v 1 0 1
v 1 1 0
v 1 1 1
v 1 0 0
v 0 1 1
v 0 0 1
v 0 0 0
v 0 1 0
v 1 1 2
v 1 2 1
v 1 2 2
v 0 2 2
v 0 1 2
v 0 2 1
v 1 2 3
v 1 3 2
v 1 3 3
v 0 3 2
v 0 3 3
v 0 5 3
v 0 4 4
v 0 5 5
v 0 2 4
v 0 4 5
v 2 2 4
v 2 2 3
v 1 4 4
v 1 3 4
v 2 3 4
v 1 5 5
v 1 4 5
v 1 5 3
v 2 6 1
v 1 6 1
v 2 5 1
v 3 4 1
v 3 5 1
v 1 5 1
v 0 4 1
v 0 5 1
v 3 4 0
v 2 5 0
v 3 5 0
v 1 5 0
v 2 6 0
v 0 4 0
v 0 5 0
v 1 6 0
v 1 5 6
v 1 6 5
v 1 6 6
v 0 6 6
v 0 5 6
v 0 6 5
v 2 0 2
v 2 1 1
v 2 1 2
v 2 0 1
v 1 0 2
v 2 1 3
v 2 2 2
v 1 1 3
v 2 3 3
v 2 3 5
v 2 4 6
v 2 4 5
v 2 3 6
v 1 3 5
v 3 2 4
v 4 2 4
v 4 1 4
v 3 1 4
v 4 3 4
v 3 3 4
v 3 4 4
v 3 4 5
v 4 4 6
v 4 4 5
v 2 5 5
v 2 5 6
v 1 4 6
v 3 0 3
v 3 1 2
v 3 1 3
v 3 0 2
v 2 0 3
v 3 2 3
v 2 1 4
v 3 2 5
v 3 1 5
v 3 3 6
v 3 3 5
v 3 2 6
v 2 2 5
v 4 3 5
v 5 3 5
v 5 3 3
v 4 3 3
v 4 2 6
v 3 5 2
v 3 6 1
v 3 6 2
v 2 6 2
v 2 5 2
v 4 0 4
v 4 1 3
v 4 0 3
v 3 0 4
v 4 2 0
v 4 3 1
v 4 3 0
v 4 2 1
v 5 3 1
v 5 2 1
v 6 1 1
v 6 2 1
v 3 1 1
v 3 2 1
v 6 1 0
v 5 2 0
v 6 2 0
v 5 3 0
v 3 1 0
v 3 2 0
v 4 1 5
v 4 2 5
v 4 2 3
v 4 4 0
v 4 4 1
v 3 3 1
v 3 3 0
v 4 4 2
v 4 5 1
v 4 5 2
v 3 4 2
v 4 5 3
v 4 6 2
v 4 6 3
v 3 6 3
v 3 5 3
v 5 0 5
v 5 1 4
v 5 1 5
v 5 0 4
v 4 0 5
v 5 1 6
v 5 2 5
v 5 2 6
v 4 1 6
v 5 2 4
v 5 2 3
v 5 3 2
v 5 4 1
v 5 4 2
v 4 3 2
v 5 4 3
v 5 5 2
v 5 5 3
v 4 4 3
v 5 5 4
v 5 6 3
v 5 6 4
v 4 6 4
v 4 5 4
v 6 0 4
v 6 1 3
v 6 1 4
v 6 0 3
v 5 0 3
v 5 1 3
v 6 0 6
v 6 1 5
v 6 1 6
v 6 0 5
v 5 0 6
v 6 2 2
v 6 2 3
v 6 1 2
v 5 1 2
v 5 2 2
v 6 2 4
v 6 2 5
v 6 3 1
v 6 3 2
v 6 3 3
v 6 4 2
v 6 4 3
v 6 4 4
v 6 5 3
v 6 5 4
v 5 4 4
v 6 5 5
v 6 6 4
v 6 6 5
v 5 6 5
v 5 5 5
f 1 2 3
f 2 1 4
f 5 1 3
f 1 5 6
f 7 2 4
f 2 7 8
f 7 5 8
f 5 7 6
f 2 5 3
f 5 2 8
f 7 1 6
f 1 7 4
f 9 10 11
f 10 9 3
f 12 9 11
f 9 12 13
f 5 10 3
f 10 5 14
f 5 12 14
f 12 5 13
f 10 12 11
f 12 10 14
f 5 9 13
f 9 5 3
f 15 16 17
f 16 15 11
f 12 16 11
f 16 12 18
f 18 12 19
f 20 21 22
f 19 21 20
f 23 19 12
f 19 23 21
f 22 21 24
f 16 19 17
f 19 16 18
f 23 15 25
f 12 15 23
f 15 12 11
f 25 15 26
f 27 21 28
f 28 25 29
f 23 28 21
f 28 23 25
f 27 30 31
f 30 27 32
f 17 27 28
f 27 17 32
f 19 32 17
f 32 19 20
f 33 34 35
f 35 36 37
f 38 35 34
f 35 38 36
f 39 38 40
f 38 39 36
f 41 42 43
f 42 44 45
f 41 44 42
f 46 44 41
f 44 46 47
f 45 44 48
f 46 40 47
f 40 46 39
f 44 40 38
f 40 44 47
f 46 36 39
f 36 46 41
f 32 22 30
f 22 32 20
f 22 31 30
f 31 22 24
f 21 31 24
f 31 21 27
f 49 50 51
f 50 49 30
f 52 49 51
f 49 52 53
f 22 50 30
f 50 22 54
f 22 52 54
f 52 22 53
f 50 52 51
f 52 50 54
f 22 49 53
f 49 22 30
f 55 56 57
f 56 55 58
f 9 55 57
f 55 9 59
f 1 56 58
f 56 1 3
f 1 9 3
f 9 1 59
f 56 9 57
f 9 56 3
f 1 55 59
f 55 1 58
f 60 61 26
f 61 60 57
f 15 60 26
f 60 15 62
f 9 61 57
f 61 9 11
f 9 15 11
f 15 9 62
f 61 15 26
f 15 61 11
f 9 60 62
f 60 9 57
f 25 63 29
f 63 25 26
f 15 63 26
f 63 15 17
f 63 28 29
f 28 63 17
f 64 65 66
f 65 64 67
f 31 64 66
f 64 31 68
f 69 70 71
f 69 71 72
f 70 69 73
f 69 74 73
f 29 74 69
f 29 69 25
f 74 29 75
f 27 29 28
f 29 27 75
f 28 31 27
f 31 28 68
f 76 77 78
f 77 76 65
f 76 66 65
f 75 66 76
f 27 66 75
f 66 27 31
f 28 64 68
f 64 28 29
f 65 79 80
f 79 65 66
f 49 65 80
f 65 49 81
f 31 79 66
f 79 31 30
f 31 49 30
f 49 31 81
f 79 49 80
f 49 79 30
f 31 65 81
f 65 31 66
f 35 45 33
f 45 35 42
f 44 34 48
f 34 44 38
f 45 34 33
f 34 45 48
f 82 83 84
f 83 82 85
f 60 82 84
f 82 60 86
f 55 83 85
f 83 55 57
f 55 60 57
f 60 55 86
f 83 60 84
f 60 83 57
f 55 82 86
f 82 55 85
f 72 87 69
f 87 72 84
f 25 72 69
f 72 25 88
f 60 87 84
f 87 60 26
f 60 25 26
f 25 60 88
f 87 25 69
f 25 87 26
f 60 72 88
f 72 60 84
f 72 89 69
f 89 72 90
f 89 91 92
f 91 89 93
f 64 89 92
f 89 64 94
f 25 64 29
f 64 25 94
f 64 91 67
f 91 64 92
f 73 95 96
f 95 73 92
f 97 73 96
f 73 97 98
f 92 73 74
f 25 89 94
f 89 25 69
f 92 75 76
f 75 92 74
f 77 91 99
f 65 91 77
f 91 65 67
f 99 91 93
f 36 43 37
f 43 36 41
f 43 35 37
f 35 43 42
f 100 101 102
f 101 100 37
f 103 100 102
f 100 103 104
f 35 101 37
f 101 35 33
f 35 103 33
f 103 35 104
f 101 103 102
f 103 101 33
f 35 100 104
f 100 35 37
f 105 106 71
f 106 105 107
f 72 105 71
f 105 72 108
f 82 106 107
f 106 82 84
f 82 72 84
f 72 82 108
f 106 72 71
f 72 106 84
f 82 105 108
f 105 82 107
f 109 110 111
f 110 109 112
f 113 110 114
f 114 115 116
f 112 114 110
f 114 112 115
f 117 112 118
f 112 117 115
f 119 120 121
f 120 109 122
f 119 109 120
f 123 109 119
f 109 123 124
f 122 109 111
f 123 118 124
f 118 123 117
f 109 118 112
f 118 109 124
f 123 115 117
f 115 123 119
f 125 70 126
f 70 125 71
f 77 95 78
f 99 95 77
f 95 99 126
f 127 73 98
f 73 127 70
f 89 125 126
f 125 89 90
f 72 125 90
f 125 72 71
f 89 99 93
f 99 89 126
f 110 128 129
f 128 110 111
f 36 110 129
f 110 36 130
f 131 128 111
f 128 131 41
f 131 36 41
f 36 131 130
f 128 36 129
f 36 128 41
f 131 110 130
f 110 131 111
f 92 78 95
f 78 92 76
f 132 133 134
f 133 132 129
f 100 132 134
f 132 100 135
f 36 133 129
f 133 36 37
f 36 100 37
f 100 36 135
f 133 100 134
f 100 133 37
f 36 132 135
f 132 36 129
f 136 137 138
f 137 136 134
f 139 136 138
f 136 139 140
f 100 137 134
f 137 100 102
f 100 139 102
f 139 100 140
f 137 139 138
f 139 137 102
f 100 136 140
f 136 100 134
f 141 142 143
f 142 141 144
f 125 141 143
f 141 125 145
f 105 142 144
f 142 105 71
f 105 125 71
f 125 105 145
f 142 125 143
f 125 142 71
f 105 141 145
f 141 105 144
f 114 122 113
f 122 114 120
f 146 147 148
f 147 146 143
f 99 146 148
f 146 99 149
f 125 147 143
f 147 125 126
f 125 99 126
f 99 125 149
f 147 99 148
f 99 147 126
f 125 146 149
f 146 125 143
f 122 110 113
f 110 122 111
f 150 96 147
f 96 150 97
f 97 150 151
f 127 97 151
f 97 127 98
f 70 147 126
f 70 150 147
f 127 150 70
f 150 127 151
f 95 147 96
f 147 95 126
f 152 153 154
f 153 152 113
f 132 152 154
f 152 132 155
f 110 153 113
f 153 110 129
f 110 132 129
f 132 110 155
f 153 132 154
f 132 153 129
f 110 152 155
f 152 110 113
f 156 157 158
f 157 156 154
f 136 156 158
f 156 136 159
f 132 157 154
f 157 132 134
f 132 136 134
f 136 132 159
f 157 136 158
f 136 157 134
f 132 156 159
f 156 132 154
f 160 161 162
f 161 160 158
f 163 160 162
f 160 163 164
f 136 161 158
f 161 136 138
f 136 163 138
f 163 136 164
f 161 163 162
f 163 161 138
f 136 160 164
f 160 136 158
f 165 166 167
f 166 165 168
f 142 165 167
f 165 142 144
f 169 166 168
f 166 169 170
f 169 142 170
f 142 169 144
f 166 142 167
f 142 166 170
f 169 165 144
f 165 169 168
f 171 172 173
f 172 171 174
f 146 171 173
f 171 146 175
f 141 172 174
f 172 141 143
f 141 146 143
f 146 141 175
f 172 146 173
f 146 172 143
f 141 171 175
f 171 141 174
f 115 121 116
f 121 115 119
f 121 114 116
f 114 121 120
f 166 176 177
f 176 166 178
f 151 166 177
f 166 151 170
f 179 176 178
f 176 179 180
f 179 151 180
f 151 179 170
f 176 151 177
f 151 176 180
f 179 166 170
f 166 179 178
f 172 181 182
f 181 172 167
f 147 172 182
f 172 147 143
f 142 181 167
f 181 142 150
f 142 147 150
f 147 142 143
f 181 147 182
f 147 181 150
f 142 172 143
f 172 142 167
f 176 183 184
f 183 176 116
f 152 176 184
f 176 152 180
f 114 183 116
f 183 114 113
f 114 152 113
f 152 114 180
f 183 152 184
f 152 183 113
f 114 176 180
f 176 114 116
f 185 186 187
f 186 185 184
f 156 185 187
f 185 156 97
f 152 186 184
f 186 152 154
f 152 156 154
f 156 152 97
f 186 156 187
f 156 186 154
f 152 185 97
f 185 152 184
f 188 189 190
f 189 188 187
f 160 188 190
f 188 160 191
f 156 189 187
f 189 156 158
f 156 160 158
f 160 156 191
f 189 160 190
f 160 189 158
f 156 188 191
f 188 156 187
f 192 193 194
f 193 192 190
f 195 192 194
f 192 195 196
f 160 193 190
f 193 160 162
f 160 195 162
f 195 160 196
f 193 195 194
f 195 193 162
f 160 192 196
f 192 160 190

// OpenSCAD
union() {
    translate([0, 0, 0]) cube([1, 1, 1]);
    translate([0, 1, 1]) cube([1, 1, 1]);
    translate([0, 2, 2]) cube([1, 1, 1]);
    translate([0, 2, 3]) cube([1, 1, 1]);
    translate([0, 3, 3]) cube([1, 1, 1]);
    translate([0, 4, 0]) cube([1, 1, 1]);
    translate([0, 4, 3]) cube([1, 1, 1]);
    translate([0, 4, 4]) cube([1, 1, 1]);
    translate([0, 5, 5]) cube([1, 1, 1]);
    translate([1, 0, 1]) cube([1, 1, 1]);
    translate([1, 1, 2]) cube([1, 1, 1]);
    translate([1, 2, 3]) cube([1, 1, 1]);
    translate([1, 3, 4]) cube([1, 1, 1]);
    translate([1, 4, 0]) cube([1, 1, 1]);
    translate([1, 4, 5]) cube([1, 1, 1]);
    translate([1, 5, 0]) cube([1, 1, 1]);
    translate([2, 0, 2]) cube([1, 1, 1]);
    translate([2, 1, 3]) cube([1, 1, 1]);
    translate([2, 2, 4]) cube([1, 1, 1]);
    translate([2, 3, 4]) cube([1, 1, 1]);
    translate([2, 3, 5]) cube([1, 1, 1]);
    translate([2, 4, 0]) cube([1, 1, 1]);
    translate([2, 5, 1]) cube([1, 1, 1]);
    translate([3, 0, 3]) cube([1, 1, 1]);
    translate([3, 1, 0]) cube([1, 1, 1]);
    translate([3, 1, 4]) cube([1, 1, 1]);
    translate([3, 2, 4]) cube([1, 1, 1]);
    translate([3, 2, 5]) cube([1, 1, 1]);
    translate([3, 3, 0]) cube([1, 1, 1]);
    translate([3, 3, 5]) cube([1, 1, 1]);
    translate([3, 4, 1]) cube([1, 1, 1]);
    translate([3, 5, 2]) cube([1, 1, 1]);
    translate([4, 0, 4]) cube([1, 1, 1]);
    translate([4, 1, 0]) cube([1, 1, 1]);
    translate([4, 1, 5]) cube([1, 1, 1]);
    translate([4, 2, 0]) cube([1, 1, 1]);
    translate([4, 2, 3]) cube([1, 1, 1]);
    translate([4, 2, 4]) cube([1, 1, 1]);
    translate([4, 3, 1]) cube([1, 1, 1]);
    translate([4, 4, 2]) cube([1, 1, 1]);
    translate([4, 5, 3]) cube([1, 1, 1]);
    translate([5, 0, 3]) cube([1, 1, 1]);
    translate([5, 0, 5]) cube([1, 1, 1]);
    translate([5, 1, 0]) cube([1, 1, 1]);
    translate([5, 1, 2]) cube([1, 1, 1]);
    translate([5, 1, 4]) cube([1, 1, 1]);
    translate([5, 2, 1]) cube([1, 1, 1]);
    translate([5, 3, 2]) cube([1, 1, 1]);
    translate([5, 4, 3]) cube([1, 1, 1]);
    translate([5, 5, 4]) cube([1, 1, 1]);
}
